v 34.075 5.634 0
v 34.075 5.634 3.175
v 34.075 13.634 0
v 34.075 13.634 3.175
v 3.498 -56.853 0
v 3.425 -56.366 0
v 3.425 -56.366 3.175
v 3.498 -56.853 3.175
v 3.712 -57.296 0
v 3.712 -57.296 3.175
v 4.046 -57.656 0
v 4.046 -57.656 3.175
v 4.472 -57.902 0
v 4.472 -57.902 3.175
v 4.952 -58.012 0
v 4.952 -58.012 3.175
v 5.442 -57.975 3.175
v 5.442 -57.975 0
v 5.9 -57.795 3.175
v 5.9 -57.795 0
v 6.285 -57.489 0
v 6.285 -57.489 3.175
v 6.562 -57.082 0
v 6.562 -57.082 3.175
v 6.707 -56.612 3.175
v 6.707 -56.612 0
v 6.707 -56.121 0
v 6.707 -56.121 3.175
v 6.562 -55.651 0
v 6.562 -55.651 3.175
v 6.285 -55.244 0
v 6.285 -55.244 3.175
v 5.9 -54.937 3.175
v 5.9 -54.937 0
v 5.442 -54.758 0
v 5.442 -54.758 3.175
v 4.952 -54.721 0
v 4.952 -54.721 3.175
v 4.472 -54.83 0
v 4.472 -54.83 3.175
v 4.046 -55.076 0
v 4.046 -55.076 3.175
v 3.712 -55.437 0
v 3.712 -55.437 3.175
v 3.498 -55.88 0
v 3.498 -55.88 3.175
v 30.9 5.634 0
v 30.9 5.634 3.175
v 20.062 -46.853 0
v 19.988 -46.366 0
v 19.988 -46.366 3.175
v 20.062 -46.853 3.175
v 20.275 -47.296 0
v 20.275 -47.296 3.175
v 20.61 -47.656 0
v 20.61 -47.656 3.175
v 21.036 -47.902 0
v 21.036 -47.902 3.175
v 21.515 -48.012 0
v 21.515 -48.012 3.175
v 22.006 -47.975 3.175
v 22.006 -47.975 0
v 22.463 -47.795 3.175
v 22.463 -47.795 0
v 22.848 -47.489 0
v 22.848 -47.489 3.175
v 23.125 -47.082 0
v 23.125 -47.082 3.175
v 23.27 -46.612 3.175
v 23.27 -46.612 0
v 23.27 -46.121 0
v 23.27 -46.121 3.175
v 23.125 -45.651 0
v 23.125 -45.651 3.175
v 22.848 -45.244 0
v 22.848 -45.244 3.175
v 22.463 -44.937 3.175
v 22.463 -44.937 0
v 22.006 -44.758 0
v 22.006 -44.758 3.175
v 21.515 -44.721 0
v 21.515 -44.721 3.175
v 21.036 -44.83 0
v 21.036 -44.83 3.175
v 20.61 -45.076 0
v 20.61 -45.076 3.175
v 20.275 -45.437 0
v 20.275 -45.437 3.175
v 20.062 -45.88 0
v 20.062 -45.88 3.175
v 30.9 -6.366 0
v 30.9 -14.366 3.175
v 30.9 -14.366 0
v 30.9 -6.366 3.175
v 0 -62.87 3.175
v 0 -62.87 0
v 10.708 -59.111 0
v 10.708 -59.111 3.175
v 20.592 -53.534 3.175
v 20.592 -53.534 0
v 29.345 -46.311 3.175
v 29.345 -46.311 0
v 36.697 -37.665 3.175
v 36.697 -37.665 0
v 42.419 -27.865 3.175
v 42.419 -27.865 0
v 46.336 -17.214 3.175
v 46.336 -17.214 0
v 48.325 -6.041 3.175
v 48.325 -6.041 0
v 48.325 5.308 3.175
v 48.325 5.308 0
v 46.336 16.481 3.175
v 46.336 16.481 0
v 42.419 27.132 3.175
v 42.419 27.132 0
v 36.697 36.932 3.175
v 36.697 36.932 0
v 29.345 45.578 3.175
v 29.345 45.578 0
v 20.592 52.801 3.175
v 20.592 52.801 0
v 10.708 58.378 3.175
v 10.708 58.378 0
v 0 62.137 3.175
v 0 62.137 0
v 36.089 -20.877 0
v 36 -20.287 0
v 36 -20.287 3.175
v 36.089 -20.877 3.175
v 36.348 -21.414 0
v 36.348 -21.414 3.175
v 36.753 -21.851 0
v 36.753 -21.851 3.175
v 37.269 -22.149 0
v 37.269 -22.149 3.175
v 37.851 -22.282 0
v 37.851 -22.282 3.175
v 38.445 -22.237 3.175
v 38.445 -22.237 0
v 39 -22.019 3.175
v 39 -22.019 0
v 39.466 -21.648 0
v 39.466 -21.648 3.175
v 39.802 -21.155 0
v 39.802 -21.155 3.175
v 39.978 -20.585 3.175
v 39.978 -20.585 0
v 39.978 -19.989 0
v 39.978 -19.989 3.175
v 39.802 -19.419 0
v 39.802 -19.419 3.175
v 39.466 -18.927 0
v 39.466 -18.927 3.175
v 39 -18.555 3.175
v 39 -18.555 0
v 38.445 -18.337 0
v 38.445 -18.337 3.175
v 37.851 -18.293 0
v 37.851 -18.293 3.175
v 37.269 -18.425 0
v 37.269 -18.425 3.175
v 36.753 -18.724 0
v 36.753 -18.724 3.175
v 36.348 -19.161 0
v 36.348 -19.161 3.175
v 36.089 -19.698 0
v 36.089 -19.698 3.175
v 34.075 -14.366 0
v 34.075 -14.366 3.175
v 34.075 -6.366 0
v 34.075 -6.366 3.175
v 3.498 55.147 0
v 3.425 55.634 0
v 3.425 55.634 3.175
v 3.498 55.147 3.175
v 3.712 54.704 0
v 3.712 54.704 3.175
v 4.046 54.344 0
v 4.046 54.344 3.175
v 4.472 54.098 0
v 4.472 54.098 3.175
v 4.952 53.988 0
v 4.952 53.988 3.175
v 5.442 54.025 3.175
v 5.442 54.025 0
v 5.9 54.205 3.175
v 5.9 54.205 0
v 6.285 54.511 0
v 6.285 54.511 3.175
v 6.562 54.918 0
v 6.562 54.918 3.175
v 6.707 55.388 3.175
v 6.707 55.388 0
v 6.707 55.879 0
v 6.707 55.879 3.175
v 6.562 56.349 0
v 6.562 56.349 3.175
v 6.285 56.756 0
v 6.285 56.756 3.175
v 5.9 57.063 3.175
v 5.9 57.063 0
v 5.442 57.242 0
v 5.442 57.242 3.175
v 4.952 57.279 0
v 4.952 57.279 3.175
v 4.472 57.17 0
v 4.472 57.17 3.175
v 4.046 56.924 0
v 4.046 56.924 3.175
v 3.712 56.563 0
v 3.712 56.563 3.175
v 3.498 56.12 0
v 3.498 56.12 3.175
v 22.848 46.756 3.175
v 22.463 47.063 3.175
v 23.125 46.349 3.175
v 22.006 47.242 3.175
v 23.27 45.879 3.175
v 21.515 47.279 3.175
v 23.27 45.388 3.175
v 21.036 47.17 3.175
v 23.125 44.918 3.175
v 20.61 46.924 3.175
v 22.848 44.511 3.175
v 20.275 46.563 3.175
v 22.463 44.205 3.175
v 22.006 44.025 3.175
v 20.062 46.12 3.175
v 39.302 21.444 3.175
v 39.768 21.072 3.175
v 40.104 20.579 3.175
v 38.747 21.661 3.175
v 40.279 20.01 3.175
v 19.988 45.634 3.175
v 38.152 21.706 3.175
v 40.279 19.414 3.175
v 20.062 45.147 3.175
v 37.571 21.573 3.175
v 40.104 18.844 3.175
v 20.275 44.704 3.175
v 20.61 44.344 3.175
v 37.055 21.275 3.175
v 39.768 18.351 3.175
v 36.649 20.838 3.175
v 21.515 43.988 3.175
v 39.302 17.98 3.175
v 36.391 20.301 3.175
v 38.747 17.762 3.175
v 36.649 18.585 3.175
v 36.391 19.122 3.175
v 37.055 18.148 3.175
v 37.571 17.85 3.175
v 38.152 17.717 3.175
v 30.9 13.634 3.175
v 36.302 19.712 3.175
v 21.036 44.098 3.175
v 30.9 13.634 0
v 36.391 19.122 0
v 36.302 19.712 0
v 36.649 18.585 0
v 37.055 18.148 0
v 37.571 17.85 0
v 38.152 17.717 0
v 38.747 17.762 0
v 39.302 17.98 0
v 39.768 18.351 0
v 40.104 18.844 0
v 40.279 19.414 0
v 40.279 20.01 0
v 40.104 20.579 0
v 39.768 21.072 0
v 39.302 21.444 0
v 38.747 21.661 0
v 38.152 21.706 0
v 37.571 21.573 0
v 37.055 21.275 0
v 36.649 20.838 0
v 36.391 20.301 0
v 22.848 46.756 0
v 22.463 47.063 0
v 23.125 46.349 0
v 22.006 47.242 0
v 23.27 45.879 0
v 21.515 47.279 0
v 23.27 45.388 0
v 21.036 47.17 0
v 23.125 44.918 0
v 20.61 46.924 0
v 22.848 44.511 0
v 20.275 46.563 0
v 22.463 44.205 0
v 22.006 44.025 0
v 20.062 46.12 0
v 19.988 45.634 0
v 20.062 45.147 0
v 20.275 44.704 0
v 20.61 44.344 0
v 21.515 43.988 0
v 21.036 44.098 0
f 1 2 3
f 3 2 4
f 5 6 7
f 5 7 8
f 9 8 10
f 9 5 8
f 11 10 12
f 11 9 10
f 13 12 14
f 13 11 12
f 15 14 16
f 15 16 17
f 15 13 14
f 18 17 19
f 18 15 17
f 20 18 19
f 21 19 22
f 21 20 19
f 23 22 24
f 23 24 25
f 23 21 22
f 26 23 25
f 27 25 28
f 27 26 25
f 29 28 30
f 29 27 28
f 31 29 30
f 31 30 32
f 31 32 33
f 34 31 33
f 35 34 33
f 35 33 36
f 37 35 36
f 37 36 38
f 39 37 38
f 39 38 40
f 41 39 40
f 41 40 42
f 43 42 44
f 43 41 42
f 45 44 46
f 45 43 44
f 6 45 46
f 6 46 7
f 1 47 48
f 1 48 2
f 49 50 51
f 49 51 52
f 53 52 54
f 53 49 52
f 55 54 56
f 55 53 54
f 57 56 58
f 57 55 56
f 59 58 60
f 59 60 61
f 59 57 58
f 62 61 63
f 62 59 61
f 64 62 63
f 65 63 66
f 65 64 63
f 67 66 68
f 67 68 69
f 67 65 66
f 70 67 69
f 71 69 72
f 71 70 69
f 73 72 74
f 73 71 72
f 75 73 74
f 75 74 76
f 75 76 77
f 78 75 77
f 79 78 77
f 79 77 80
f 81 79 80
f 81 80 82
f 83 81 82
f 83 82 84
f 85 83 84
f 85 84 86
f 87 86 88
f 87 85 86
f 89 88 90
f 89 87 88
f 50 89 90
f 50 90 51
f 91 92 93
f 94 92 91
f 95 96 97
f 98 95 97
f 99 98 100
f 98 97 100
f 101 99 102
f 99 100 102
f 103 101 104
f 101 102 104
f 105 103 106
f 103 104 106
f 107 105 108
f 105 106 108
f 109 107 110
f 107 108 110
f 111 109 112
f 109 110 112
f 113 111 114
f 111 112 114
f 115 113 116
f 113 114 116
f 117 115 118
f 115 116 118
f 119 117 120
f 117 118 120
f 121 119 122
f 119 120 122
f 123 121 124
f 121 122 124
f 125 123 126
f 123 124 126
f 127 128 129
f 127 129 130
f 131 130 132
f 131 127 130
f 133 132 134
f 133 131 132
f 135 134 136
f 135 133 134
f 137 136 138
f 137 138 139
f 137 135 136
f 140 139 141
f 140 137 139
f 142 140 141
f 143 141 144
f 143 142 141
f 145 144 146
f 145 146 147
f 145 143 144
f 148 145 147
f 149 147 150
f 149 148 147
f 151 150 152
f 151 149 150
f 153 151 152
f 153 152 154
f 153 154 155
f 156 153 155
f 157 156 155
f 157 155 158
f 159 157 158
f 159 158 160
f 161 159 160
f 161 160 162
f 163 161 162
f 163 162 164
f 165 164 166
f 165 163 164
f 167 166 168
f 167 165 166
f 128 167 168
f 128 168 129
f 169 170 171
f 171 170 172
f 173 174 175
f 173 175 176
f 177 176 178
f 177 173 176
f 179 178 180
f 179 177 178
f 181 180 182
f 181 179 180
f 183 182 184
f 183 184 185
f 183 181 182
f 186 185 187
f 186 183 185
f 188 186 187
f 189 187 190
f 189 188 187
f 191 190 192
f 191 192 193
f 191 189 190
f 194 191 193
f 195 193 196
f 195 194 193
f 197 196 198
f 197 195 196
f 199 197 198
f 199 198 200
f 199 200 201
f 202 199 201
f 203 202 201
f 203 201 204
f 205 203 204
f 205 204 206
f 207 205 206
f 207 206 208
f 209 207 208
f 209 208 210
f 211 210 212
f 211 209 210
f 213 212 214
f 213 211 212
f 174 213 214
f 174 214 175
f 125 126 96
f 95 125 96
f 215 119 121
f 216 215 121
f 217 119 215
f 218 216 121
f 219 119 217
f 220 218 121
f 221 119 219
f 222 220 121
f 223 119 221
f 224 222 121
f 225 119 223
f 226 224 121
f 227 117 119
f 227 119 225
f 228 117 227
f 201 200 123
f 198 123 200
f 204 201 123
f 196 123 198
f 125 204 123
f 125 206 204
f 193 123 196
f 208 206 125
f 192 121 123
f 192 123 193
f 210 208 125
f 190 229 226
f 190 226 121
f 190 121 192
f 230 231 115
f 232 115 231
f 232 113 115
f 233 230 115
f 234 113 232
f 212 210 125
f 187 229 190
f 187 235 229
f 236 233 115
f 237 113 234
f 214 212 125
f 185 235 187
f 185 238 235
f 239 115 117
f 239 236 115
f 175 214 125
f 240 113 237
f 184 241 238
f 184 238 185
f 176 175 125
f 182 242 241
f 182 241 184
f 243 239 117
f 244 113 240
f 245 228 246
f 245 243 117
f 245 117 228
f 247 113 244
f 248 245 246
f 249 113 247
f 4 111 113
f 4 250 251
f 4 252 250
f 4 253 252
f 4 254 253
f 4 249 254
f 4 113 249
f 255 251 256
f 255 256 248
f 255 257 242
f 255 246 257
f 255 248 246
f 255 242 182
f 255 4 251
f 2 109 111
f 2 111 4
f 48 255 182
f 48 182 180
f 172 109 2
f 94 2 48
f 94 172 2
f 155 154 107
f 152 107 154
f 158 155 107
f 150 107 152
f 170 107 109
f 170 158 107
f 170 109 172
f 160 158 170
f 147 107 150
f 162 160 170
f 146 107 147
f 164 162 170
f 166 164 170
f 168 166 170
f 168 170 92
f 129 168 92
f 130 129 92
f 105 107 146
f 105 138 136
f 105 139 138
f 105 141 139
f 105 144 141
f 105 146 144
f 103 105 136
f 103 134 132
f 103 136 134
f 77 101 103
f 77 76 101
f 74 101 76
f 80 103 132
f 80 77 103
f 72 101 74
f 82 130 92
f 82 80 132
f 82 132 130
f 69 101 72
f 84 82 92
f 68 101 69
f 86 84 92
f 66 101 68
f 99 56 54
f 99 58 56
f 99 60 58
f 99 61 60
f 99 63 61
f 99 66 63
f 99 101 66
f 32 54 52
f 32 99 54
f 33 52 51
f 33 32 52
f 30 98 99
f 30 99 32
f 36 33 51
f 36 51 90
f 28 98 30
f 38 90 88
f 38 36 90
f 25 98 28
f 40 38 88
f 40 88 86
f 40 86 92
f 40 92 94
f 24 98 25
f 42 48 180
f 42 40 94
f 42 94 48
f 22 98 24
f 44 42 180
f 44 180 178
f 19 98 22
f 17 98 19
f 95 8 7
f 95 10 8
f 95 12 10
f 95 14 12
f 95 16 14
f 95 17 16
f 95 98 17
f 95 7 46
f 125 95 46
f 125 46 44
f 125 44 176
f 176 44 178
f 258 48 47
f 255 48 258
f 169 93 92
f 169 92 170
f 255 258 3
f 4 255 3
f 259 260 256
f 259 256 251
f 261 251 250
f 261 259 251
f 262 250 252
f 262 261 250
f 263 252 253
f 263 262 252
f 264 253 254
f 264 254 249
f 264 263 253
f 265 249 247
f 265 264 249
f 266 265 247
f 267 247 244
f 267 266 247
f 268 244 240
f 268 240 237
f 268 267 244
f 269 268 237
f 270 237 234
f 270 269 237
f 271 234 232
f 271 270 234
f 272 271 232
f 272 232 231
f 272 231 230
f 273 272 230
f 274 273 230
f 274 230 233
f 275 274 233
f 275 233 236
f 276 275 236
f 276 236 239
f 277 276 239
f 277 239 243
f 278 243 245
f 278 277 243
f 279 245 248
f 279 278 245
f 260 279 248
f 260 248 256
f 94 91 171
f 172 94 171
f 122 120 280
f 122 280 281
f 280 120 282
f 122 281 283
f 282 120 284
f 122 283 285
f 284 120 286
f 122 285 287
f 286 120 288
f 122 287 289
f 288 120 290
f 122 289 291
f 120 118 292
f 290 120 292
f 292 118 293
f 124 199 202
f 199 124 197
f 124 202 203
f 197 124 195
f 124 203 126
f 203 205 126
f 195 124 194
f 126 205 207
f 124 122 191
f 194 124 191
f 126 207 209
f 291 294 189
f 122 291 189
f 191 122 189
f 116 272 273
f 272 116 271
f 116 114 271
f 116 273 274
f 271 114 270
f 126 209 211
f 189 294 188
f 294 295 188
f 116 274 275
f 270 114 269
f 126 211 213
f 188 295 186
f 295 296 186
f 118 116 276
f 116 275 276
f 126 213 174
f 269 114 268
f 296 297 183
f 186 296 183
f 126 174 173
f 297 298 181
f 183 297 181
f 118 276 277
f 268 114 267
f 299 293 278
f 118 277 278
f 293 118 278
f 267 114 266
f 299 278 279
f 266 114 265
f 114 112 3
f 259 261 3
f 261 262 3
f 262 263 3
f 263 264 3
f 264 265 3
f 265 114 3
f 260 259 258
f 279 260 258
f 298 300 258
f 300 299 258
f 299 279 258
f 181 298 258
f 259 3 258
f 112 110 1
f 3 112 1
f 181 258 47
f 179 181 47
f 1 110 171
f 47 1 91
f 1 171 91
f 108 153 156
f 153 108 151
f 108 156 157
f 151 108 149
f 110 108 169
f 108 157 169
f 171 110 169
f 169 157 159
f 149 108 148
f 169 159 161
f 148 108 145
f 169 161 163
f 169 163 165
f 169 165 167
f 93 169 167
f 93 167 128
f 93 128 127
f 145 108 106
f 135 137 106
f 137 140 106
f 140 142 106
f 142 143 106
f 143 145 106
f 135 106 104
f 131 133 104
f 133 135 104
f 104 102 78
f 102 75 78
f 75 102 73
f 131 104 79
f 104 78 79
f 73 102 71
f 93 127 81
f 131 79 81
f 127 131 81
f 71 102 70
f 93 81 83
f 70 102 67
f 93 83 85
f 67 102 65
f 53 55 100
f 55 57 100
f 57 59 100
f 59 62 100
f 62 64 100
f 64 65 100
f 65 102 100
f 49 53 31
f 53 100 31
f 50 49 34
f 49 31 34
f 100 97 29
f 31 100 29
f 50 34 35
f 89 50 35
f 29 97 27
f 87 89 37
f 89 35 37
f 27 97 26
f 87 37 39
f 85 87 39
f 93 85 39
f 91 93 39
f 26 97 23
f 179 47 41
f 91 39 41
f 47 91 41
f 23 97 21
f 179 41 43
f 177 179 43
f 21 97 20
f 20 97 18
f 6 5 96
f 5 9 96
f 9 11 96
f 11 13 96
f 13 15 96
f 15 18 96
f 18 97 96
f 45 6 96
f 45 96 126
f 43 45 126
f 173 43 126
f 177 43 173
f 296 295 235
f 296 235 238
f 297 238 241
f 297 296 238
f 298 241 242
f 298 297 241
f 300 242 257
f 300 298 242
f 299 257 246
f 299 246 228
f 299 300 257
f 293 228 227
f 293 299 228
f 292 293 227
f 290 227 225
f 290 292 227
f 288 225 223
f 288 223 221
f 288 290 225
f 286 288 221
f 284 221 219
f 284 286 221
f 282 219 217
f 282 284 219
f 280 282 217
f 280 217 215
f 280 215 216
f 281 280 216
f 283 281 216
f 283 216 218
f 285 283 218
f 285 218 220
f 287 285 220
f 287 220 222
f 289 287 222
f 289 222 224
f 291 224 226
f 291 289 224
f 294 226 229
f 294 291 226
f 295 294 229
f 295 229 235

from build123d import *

# Parameters (mm, degrees)
SKETCH1_R           = 1.65
SKETCH1_R_2         = 2
BOSS_EXTRUDE1_DEPTH = 3.175
SKETCH2_W           = 3.175
SKETCH2_H           = 8
CUT_EXTRUDE1_DEPTH  = 4.175


with BuildPart() as part:
    # Sketch1 → Boss-Extrude1 (new body)
    with BuildSketch(Plane(origin=(0, 0, 0), x_dir=(-1, 0, 0), z_dir=(0, 0, 1))):
        with BuildLine():
            Line((0, -62.136729163), (0, 62.869580678))
            ThreePointArc((0, 62.869580678), (-48.575, 0.366425758), (0, -62.136729163))
        make_face()
        with Locations((-5.075, 56.366425758)):
            Circle(SKETCH1_R, mode=Mode.SUBTRACT)
        with Locations((-21.638471196, 46.366425758)):
            Circle(SKETCH1_R, mode=Mode.SUBTRACT)
        with Locations((-5.075, -55.633574242)):
            Circle(SKETCH1_R, mode=Mode.SUBTRACT)
        with Locations((-21.638471196, -45.633574242)):
            Circle(SKETCH1_R, mode=Mode.SUBTRACT)
        with Locations((-38, 20.287222228)):
            Circle(SKETCH1_R_2, mode=Mode.SUBTRACT)
        with Locations((-38.301731617, -19.711639731)):
            Circle(SKETCH1_R_2, mode=Mode.SUBTRACT)
    extrude(amount=BOSS_EXTRUDE1_DEPTH)

    # Sketch2 → Cut-Extrude1 (cut, through all)
    with BuildSketch(Plane.XY.offset(3.175)):
        with Locations((32.4875, 9.633574242)):
            Rectangle(SKETCH2_W, SKETCH2_H)
        with Locations((32.4875, -10.366425758)):
            Rectangle(SKETCH2_W, SKETCH2_H)
    extrude(amount=-CUT_EXTRUDE1_DEPTH, mode=Mode.SUBTRACT)


solid = part.part
